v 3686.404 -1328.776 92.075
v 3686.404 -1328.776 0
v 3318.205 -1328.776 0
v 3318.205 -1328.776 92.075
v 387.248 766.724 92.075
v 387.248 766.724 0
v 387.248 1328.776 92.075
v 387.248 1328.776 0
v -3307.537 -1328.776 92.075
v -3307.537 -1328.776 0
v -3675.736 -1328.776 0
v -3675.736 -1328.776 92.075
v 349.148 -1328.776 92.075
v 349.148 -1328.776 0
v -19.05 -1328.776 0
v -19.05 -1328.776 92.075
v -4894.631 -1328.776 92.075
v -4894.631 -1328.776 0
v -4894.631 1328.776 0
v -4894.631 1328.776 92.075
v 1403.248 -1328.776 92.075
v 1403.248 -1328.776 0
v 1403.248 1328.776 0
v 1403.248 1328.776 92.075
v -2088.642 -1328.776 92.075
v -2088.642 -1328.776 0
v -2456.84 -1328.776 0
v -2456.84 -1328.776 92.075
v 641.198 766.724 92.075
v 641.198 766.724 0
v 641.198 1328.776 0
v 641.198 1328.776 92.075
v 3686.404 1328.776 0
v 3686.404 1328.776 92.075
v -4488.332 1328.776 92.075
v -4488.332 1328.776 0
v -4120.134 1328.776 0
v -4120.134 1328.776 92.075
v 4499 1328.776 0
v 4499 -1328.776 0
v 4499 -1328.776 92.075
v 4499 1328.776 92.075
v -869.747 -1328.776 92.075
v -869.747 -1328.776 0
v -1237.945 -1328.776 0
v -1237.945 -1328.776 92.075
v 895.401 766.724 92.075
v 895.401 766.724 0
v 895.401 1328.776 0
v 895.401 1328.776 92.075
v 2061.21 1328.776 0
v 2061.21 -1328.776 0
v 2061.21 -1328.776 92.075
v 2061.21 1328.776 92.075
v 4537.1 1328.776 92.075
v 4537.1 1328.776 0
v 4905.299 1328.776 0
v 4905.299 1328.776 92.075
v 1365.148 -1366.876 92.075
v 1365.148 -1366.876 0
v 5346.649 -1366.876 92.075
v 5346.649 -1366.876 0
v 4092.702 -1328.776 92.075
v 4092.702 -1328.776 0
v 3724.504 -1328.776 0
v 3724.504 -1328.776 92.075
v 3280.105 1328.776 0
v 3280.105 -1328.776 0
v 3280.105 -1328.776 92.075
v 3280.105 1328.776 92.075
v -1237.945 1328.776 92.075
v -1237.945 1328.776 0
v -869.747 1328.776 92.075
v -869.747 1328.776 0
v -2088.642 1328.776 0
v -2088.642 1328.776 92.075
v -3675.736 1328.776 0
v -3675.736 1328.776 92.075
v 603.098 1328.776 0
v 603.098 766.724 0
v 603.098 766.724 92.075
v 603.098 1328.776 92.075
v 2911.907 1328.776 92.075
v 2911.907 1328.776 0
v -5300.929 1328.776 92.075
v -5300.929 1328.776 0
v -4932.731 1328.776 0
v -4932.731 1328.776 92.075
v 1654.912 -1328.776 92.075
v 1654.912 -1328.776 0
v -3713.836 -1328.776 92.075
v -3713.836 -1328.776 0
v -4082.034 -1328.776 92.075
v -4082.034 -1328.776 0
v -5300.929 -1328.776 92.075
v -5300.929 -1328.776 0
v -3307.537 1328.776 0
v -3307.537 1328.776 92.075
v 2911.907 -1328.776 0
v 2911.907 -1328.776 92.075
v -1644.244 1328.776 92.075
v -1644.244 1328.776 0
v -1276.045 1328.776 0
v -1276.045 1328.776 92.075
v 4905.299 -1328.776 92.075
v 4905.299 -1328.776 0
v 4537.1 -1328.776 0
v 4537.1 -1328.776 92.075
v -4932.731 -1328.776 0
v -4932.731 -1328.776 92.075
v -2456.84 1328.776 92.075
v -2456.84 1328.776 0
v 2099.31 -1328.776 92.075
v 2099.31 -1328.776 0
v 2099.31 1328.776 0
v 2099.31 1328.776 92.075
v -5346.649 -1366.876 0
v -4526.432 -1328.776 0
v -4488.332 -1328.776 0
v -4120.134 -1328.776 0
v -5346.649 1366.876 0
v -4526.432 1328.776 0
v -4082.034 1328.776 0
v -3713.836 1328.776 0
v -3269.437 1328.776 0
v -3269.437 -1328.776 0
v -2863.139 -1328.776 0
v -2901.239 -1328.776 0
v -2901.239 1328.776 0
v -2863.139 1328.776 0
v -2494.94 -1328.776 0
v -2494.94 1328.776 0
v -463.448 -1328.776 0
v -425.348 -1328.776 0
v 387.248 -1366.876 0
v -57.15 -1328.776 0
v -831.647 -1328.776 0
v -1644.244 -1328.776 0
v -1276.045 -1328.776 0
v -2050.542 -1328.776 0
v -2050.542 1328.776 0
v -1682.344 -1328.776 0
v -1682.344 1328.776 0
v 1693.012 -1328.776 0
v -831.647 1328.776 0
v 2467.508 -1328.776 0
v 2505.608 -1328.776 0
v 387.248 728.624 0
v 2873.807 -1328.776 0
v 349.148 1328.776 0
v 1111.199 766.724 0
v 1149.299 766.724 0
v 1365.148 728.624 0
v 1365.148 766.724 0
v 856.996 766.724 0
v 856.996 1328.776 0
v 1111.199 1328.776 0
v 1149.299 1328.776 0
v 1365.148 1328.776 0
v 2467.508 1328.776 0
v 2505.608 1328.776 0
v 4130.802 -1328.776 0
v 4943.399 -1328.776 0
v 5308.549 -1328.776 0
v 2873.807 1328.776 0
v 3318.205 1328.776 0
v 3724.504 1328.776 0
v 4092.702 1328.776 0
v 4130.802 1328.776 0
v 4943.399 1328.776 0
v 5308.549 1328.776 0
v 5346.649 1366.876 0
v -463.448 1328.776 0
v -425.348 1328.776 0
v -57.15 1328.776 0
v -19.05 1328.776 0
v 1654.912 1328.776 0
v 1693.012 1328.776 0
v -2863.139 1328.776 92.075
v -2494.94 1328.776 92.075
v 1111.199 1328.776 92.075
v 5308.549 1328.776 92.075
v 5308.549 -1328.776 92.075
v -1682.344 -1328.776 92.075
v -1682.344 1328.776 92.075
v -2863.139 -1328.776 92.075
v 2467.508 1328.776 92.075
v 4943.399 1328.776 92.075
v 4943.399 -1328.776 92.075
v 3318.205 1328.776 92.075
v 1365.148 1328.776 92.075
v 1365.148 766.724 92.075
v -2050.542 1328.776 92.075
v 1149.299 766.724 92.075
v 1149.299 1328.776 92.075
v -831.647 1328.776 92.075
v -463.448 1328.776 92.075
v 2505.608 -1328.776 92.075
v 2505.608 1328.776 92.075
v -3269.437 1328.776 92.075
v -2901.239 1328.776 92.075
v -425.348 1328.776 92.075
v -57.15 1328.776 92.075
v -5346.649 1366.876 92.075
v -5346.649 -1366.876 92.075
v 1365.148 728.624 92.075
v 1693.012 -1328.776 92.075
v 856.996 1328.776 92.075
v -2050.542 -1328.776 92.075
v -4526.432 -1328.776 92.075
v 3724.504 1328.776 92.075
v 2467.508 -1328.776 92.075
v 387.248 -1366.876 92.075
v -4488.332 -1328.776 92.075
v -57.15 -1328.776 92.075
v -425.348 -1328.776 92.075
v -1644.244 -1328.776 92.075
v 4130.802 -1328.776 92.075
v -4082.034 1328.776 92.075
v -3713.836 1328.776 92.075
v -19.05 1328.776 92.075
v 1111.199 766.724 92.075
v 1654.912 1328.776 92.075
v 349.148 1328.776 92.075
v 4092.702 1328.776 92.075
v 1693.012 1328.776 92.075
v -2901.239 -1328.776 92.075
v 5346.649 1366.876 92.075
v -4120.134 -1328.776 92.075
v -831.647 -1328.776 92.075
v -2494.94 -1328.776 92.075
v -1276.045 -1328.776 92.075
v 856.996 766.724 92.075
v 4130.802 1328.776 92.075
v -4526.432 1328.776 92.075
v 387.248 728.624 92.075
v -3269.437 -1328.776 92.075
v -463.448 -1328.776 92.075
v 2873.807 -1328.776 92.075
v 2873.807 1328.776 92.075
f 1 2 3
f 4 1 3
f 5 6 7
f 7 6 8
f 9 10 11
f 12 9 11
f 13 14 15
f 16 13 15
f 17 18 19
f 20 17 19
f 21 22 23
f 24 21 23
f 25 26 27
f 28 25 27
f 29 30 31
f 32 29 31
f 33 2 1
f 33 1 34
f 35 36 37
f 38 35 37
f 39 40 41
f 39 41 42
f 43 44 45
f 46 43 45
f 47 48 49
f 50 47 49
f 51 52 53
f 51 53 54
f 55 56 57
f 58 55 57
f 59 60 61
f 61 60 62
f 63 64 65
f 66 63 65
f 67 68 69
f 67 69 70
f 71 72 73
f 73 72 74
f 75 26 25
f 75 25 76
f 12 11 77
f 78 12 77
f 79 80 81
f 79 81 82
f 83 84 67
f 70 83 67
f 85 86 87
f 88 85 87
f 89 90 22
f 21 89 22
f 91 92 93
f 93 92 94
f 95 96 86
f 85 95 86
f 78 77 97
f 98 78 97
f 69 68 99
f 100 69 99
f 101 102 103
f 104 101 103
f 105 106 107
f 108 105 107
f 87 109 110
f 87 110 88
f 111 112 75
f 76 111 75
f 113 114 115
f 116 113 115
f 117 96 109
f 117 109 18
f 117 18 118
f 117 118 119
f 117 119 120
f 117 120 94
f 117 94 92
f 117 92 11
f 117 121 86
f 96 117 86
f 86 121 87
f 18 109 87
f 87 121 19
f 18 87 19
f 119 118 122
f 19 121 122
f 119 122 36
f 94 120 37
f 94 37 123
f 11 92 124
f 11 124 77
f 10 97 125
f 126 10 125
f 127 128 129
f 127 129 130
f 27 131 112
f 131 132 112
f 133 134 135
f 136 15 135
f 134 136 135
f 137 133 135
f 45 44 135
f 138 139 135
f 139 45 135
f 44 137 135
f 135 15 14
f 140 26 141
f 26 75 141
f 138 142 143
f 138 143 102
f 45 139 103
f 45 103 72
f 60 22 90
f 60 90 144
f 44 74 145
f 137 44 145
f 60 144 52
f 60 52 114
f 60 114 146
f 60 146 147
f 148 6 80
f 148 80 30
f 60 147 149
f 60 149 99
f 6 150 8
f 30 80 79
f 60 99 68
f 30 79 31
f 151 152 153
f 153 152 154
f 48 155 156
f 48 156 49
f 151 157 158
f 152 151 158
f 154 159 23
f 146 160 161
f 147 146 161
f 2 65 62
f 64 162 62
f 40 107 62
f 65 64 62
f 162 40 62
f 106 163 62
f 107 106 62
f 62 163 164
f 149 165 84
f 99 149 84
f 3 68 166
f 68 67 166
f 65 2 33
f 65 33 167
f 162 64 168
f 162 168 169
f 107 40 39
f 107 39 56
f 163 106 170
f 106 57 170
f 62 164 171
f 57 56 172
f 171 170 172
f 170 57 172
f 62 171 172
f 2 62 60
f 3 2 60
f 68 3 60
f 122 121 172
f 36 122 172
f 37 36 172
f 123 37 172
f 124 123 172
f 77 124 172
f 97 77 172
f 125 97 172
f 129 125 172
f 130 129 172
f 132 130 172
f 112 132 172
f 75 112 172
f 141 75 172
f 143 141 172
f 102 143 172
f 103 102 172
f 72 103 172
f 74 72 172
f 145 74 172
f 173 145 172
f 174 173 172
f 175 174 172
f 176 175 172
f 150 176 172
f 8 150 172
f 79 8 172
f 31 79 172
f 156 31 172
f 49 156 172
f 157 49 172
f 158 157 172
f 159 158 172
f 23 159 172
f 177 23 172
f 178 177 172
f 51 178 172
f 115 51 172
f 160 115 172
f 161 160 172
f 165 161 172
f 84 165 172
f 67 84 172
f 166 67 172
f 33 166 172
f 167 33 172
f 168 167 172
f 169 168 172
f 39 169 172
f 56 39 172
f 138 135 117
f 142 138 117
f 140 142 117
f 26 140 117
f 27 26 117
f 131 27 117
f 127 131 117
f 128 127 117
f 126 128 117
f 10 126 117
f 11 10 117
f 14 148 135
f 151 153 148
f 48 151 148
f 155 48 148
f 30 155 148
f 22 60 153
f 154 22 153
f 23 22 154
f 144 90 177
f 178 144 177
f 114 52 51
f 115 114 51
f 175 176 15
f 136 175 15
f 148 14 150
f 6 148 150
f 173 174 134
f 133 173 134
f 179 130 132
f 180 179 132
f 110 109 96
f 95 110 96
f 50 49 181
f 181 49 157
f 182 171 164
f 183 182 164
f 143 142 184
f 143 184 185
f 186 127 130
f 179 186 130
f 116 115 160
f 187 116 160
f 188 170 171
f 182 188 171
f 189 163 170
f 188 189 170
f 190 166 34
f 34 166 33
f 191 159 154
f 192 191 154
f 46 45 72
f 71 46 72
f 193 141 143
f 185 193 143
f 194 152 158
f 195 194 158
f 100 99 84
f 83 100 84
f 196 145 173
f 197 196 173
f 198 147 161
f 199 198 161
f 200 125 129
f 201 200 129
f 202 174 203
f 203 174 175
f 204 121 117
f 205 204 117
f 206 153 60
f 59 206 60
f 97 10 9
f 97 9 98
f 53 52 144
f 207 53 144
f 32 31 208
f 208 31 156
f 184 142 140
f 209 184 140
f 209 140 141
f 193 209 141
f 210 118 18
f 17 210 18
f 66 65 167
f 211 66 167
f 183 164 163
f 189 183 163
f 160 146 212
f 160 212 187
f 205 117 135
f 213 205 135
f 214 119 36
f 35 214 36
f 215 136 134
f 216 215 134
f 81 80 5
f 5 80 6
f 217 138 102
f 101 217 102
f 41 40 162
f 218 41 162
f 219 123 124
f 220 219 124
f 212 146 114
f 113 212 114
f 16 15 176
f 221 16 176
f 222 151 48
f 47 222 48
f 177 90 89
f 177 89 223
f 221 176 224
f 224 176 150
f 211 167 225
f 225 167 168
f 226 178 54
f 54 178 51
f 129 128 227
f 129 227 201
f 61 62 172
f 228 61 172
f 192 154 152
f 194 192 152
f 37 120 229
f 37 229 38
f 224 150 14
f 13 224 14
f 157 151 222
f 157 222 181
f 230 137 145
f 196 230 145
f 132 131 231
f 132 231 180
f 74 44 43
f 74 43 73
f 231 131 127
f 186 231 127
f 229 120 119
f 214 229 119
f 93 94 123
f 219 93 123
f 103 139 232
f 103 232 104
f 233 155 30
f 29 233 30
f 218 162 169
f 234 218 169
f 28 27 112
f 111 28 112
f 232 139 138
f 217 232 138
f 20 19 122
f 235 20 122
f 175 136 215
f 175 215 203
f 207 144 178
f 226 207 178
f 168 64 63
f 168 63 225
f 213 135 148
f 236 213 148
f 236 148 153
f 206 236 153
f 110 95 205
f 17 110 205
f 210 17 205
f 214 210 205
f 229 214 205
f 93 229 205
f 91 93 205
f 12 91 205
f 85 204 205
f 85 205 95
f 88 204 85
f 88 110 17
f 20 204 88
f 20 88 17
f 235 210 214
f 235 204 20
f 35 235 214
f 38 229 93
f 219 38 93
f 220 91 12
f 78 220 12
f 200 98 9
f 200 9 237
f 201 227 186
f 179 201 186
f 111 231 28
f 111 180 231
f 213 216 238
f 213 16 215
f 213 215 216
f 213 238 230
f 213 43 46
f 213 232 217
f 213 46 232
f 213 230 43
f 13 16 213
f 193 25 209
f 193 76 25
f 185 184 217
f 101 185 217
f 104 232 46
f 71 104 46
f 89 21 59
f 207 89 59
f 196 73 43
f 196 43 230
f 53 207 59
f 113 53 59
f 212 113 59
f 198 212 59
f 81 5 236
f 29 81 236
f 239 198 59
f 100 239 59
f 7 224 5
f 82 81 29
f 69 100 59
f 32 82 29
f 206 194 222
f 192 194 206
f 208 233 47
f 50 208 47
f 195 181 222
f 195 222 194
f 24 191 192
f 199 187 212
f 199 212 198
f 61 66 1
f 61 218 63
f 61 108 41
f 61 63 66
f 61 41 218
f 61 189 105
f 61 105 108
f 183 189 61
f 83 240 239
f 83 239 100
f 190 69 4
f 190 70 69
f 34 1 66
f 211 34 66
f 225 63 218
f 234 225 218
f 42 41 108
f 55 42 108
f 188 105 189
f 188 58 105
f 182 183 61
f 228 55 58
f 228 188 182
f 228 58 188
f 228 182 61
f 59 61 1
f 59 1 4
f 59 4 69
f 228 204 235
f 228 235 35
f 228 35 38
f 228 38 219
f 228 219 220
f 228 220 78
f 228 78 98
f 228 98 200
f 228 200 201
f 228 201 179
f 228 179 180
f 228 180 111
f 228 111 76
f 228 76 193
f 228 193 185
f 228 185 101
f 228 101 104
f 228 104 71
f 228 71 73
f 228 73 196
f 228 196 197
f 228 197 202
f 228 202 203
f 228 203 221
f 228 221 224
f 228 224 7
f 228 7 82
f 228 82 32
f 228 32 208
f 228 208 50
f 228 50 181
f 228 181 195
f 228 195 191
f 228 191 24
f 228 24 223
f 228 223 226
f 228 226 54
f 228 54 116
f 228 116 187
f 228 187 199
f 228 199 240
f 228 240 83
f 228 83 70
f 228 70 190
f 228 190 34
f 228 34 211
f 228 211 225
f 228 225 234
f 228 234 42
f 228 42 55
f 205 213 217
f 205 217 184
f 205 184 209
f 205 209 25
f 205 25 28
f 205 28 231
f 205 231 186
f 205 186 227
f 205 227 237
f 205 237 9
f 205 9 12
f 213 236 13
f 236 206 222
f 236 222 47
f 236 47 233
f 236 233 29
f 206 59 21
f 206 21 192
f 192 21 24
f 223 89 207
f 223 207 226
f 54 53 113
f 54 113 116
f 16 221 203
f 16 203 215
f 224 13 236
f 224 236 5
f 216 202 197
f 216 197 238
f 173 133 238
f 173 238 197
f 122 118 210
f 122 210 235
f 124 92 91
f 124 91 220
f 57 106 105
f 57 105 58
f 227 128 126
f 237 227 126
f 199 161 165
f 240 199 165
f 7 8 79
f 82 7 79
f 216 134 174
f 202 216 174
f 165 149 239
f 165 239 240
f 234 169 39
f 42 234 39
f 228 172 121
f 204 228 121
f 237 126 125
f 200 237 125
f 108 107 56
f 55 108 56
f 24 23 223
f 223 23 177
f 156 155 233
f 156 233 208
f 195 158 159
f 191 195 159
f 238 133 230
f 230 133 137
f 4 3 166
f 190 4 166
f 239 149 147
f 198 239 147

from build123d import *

# Parameters (mm, degrees)
F0_W     = 38.1
F0_H     = 2657.5512
F0_H_2   = 562.0512
F0_W_2   = 38.4048
F1_DEPTH = 92.075


# Not quite as in the source:
# - a feature names something its author has since deleted; it is built from what else it names


with BuildPart() as f1:
    # F0 (on Top) → F1 (new body)
    with BuildSketch(Plane.XY):
        Polygon((1365.1484, -1366.8756), (5346.6492, -1366.8756), (5346.6492, 1366.8756), (-5346.6492, 1366.8756), (-5346.6492, -1366.8756), (387.2484, -1366.8756), (387.2484, -1328.7756), (349.1484, -1328.7756), (-19.05, -1328.7756), (-57.15, -1328.7756), (-425.3484, -1328.7756), (-463.4484, -1328.7756), (-831.6468, -1328.7756), (-869.7468, -1328.7756), (-1237.9452, -1328.7756), (-1276.0452, -1328.7756), (-1644.2436, -1328.7756), (-1682.3436, -1328.7756), (-2050.542, -1328.7756), (-2088.642, -1328.7756), (-2456.8404, -1328.7756), (-2494.9404, -1328.7756), (-2863.1388, -1328.7756), (-2901.2388, -1328.7756), (-3269.4372, -1328.7756), (-3307.5372, -1328.7756), (-3675.7356, -1328.7756), (-3713.8356, -1328.7756), (-4082.034, -1328.7756), (-4120.134, -1328.7756), (-4488.3324, -1328.7756), (-4526.4324, -1328.7756), (-4894.6308, -1328.7756), (-4932.7308, -1328.7756), (-5300.9292, -1328.7756), (-5300.9292, 1328.7756), (-4932.7308, 1328.7756), (-4894.6308, 1328.7756), (-4526.4324, 1328.7756), (-4488.3324, 1328.7756), (-4120.134, 1328.7756), (-4082.034, 1328.7756), (-3713.8356, 1328.7756), (-3675.7356, 1328.7756), (-3307.5372, 1328.7756), (-3269.4372, 1328.7756), (-2901.2388, 1328.7756), (-2863.1388, 1328.7756), (-2494.9404, 1328.7756), (-2456.8404, 1328.7756), (-2088.642, 1328.7756), (-2050.542, 1328.7756), (-1682.3436, 1328.7756), (-1644.2436, 1328.7756), (-1276.0452, 1328.7756), (-1237.9452, 1328.7756), (-869.7468, 1328.7756), (-831.6468, 1328.7756), (-463.4484, 1328.7756), (-425.3484, 1328.7756), (-57.15, 1328.7756), (-19.05, 1328.7756), (349.1484, 1328.7756), (387.2484, 1328.7756), (603.0976, 1328.7756), (641.1976, 1328.7756), (856.996, 1328.7756), (895.4008, 1328.7756), (1111.1992, 1328.7756), (1149.2992, 1328.7756), (1365.1484, 1328.7756), (1403.2484, 1328.7756), (1654.911601016, 1328.7756), (1693.011601016, 1328.7756), (2061.210001016, 1328.7756), (2099.310001016, 1328.7756), (2467.508401016, 1328.7756), (2505.608401016, 1328.7756), (2873.806801016, 1328.7756), (2911.906801016, 1328.7756), (3280.105201016, 1328.7756), (3318.205201016, 1328.7756), (3686.403601016, 1328.7756), (3724.503601016, 1328.7756), (4092.702001016, 1328.7756), (4130.802001016, 1328.7756), (4499.000401016, 1328.7756), (4537.100401016, 1328.7756), (4905.298801016, 1328.7756), (4943.398801016, 1328.7756), (5308.5492, 1328.7756), (5308.5492, -1328.7756), (4943.398801016, -1328.7756), (4905.298801016, -1328.7756), (4537.100401016, -1328.7756), (4499.000401016, -1328.7756), (4130.802001016, -1328.7756), (4092.702001016, -1328.7756), (3724.503601016, -1328.7756), (3686.403601016, -1328.7756), (3318.205201016, -1328.7756), (3280.105201016, -1328.7756), (2911.906801016, -1328.7756), (2873.806801016, -1328.7756), (2505.608401016, -1328.7756), (2467.508401016, -1328.7756), (2099.310001016, -1328.7756), (2061.210001016, -1328.7756), (1693.011601016, -1328.7756), (1654.911601016, -1328.7756), (1403.2484, -1328.7756), (1365.1484, -1328.7756), align=None)
        with Locations((-4913.6808, 0)):
            Rectangle(F0_W, F0_H)
        with Locations((-4507.3824, 0)):
            Rectangle(F0_W, F0_H)
        with Locations((-4101.084, 0)):
            Rectangle(F0_W, F0_H)
        with Locations((-3694.7856, 0)):
            Rectangle(F0_W, F0_H)
        with Locations((-3288.4872, 0)):
            Rectangle(F0_W, F0_H)
        with Locations((-2882.1888, 0)):
            Rectangle(F0_W, F0_H)
        with Locations((-2475.8904, 0)):
            Rectangle(F0_W, F0_H)
        with Locations((-2069.592, 0)):
            Rectangle(F0_W, F0_H)
        with Locations((-1663.2936, 0)):
            Rectangle(F0_W, F0_H)
        with Locations((-1256.9952, 0)):
            Rectangle(F0_W, F0_H)
        with Locations((-850.6968, 0)):
            Rectangle(F0_W, F0_H)
        with Locations((-444.3984, 0)):
            Rectangle(F0_W, F0_H)
        Polygon((349.1484, -1328.7756), (387.2484, -1328.7756), (387.2484, 728.6244), (387.2484, 766.7244), (387.2484, 1328.7756), (349.1484, 1328.7756), align=None)
        Polygon((387.2484, 728.6244), (1365.1484, 728.6244), (1365.1484, 766.7244), (1149.2992, 766.7244), (1111.1992, 766.7244), (895.4008, 766.7244), (856.996, 766.7244), (641.1976, 766.7244), (603.0976, 766.7244), (387.2484, 766.7244), align=None)
        with Locations((622.1476, 1047.75)):
            Rectangle(F0_W, F0_H_2)
        with Locations((876.1984, 1047.75)):
            Rectangle(F0_W_2, F0_H_2)
        with Locations((1130.2492, 1047.75)):
            Rectangle(F0_W, F0_H_2)
        Polygon((1365.1484, 728.6244), (1365.1484, -1328.7756), (1403.2484, -1328.7756), (1403.2484, 1328.7756), (1365.1484, 1328.7756), (1365.1484, 766.7244), align=None)
        with Locations((1673.961601016, 0)):
            Rectangle(F0_W, F0_H)
        with Locations((2080.260001016, 0)):
            Rectangle(F0_W, F0_H)
        with Locations((2486.558401016, 0)):
            Rectangle(F0_W, F0_H)
        with Locations((2892.856801016, 0)):
            Rectangle(F0_W, F0_H)
        with Locations((3299.155201016, 0)):
            Rectangle(F0_W, F0_H)
        with Locations((3705.453601016, 0)):
            Rectangle(F0_W, F0_H)
        with Locations((4111.752001016, 0)):
            Rectangle(F0_W, F0_H)
        with Locations((4518.050401016, 0)):
            Rectangle(F0_W, F0_H)
        with Locations((4924.348801016, 0)):
            Rectangle(F0_W, F0_H)
        with Locations((-38.1, 0)):
            Rectangle(F0_W, F0_H)
    extrude(amount=F1_DEPTH)


solid = f1.part
